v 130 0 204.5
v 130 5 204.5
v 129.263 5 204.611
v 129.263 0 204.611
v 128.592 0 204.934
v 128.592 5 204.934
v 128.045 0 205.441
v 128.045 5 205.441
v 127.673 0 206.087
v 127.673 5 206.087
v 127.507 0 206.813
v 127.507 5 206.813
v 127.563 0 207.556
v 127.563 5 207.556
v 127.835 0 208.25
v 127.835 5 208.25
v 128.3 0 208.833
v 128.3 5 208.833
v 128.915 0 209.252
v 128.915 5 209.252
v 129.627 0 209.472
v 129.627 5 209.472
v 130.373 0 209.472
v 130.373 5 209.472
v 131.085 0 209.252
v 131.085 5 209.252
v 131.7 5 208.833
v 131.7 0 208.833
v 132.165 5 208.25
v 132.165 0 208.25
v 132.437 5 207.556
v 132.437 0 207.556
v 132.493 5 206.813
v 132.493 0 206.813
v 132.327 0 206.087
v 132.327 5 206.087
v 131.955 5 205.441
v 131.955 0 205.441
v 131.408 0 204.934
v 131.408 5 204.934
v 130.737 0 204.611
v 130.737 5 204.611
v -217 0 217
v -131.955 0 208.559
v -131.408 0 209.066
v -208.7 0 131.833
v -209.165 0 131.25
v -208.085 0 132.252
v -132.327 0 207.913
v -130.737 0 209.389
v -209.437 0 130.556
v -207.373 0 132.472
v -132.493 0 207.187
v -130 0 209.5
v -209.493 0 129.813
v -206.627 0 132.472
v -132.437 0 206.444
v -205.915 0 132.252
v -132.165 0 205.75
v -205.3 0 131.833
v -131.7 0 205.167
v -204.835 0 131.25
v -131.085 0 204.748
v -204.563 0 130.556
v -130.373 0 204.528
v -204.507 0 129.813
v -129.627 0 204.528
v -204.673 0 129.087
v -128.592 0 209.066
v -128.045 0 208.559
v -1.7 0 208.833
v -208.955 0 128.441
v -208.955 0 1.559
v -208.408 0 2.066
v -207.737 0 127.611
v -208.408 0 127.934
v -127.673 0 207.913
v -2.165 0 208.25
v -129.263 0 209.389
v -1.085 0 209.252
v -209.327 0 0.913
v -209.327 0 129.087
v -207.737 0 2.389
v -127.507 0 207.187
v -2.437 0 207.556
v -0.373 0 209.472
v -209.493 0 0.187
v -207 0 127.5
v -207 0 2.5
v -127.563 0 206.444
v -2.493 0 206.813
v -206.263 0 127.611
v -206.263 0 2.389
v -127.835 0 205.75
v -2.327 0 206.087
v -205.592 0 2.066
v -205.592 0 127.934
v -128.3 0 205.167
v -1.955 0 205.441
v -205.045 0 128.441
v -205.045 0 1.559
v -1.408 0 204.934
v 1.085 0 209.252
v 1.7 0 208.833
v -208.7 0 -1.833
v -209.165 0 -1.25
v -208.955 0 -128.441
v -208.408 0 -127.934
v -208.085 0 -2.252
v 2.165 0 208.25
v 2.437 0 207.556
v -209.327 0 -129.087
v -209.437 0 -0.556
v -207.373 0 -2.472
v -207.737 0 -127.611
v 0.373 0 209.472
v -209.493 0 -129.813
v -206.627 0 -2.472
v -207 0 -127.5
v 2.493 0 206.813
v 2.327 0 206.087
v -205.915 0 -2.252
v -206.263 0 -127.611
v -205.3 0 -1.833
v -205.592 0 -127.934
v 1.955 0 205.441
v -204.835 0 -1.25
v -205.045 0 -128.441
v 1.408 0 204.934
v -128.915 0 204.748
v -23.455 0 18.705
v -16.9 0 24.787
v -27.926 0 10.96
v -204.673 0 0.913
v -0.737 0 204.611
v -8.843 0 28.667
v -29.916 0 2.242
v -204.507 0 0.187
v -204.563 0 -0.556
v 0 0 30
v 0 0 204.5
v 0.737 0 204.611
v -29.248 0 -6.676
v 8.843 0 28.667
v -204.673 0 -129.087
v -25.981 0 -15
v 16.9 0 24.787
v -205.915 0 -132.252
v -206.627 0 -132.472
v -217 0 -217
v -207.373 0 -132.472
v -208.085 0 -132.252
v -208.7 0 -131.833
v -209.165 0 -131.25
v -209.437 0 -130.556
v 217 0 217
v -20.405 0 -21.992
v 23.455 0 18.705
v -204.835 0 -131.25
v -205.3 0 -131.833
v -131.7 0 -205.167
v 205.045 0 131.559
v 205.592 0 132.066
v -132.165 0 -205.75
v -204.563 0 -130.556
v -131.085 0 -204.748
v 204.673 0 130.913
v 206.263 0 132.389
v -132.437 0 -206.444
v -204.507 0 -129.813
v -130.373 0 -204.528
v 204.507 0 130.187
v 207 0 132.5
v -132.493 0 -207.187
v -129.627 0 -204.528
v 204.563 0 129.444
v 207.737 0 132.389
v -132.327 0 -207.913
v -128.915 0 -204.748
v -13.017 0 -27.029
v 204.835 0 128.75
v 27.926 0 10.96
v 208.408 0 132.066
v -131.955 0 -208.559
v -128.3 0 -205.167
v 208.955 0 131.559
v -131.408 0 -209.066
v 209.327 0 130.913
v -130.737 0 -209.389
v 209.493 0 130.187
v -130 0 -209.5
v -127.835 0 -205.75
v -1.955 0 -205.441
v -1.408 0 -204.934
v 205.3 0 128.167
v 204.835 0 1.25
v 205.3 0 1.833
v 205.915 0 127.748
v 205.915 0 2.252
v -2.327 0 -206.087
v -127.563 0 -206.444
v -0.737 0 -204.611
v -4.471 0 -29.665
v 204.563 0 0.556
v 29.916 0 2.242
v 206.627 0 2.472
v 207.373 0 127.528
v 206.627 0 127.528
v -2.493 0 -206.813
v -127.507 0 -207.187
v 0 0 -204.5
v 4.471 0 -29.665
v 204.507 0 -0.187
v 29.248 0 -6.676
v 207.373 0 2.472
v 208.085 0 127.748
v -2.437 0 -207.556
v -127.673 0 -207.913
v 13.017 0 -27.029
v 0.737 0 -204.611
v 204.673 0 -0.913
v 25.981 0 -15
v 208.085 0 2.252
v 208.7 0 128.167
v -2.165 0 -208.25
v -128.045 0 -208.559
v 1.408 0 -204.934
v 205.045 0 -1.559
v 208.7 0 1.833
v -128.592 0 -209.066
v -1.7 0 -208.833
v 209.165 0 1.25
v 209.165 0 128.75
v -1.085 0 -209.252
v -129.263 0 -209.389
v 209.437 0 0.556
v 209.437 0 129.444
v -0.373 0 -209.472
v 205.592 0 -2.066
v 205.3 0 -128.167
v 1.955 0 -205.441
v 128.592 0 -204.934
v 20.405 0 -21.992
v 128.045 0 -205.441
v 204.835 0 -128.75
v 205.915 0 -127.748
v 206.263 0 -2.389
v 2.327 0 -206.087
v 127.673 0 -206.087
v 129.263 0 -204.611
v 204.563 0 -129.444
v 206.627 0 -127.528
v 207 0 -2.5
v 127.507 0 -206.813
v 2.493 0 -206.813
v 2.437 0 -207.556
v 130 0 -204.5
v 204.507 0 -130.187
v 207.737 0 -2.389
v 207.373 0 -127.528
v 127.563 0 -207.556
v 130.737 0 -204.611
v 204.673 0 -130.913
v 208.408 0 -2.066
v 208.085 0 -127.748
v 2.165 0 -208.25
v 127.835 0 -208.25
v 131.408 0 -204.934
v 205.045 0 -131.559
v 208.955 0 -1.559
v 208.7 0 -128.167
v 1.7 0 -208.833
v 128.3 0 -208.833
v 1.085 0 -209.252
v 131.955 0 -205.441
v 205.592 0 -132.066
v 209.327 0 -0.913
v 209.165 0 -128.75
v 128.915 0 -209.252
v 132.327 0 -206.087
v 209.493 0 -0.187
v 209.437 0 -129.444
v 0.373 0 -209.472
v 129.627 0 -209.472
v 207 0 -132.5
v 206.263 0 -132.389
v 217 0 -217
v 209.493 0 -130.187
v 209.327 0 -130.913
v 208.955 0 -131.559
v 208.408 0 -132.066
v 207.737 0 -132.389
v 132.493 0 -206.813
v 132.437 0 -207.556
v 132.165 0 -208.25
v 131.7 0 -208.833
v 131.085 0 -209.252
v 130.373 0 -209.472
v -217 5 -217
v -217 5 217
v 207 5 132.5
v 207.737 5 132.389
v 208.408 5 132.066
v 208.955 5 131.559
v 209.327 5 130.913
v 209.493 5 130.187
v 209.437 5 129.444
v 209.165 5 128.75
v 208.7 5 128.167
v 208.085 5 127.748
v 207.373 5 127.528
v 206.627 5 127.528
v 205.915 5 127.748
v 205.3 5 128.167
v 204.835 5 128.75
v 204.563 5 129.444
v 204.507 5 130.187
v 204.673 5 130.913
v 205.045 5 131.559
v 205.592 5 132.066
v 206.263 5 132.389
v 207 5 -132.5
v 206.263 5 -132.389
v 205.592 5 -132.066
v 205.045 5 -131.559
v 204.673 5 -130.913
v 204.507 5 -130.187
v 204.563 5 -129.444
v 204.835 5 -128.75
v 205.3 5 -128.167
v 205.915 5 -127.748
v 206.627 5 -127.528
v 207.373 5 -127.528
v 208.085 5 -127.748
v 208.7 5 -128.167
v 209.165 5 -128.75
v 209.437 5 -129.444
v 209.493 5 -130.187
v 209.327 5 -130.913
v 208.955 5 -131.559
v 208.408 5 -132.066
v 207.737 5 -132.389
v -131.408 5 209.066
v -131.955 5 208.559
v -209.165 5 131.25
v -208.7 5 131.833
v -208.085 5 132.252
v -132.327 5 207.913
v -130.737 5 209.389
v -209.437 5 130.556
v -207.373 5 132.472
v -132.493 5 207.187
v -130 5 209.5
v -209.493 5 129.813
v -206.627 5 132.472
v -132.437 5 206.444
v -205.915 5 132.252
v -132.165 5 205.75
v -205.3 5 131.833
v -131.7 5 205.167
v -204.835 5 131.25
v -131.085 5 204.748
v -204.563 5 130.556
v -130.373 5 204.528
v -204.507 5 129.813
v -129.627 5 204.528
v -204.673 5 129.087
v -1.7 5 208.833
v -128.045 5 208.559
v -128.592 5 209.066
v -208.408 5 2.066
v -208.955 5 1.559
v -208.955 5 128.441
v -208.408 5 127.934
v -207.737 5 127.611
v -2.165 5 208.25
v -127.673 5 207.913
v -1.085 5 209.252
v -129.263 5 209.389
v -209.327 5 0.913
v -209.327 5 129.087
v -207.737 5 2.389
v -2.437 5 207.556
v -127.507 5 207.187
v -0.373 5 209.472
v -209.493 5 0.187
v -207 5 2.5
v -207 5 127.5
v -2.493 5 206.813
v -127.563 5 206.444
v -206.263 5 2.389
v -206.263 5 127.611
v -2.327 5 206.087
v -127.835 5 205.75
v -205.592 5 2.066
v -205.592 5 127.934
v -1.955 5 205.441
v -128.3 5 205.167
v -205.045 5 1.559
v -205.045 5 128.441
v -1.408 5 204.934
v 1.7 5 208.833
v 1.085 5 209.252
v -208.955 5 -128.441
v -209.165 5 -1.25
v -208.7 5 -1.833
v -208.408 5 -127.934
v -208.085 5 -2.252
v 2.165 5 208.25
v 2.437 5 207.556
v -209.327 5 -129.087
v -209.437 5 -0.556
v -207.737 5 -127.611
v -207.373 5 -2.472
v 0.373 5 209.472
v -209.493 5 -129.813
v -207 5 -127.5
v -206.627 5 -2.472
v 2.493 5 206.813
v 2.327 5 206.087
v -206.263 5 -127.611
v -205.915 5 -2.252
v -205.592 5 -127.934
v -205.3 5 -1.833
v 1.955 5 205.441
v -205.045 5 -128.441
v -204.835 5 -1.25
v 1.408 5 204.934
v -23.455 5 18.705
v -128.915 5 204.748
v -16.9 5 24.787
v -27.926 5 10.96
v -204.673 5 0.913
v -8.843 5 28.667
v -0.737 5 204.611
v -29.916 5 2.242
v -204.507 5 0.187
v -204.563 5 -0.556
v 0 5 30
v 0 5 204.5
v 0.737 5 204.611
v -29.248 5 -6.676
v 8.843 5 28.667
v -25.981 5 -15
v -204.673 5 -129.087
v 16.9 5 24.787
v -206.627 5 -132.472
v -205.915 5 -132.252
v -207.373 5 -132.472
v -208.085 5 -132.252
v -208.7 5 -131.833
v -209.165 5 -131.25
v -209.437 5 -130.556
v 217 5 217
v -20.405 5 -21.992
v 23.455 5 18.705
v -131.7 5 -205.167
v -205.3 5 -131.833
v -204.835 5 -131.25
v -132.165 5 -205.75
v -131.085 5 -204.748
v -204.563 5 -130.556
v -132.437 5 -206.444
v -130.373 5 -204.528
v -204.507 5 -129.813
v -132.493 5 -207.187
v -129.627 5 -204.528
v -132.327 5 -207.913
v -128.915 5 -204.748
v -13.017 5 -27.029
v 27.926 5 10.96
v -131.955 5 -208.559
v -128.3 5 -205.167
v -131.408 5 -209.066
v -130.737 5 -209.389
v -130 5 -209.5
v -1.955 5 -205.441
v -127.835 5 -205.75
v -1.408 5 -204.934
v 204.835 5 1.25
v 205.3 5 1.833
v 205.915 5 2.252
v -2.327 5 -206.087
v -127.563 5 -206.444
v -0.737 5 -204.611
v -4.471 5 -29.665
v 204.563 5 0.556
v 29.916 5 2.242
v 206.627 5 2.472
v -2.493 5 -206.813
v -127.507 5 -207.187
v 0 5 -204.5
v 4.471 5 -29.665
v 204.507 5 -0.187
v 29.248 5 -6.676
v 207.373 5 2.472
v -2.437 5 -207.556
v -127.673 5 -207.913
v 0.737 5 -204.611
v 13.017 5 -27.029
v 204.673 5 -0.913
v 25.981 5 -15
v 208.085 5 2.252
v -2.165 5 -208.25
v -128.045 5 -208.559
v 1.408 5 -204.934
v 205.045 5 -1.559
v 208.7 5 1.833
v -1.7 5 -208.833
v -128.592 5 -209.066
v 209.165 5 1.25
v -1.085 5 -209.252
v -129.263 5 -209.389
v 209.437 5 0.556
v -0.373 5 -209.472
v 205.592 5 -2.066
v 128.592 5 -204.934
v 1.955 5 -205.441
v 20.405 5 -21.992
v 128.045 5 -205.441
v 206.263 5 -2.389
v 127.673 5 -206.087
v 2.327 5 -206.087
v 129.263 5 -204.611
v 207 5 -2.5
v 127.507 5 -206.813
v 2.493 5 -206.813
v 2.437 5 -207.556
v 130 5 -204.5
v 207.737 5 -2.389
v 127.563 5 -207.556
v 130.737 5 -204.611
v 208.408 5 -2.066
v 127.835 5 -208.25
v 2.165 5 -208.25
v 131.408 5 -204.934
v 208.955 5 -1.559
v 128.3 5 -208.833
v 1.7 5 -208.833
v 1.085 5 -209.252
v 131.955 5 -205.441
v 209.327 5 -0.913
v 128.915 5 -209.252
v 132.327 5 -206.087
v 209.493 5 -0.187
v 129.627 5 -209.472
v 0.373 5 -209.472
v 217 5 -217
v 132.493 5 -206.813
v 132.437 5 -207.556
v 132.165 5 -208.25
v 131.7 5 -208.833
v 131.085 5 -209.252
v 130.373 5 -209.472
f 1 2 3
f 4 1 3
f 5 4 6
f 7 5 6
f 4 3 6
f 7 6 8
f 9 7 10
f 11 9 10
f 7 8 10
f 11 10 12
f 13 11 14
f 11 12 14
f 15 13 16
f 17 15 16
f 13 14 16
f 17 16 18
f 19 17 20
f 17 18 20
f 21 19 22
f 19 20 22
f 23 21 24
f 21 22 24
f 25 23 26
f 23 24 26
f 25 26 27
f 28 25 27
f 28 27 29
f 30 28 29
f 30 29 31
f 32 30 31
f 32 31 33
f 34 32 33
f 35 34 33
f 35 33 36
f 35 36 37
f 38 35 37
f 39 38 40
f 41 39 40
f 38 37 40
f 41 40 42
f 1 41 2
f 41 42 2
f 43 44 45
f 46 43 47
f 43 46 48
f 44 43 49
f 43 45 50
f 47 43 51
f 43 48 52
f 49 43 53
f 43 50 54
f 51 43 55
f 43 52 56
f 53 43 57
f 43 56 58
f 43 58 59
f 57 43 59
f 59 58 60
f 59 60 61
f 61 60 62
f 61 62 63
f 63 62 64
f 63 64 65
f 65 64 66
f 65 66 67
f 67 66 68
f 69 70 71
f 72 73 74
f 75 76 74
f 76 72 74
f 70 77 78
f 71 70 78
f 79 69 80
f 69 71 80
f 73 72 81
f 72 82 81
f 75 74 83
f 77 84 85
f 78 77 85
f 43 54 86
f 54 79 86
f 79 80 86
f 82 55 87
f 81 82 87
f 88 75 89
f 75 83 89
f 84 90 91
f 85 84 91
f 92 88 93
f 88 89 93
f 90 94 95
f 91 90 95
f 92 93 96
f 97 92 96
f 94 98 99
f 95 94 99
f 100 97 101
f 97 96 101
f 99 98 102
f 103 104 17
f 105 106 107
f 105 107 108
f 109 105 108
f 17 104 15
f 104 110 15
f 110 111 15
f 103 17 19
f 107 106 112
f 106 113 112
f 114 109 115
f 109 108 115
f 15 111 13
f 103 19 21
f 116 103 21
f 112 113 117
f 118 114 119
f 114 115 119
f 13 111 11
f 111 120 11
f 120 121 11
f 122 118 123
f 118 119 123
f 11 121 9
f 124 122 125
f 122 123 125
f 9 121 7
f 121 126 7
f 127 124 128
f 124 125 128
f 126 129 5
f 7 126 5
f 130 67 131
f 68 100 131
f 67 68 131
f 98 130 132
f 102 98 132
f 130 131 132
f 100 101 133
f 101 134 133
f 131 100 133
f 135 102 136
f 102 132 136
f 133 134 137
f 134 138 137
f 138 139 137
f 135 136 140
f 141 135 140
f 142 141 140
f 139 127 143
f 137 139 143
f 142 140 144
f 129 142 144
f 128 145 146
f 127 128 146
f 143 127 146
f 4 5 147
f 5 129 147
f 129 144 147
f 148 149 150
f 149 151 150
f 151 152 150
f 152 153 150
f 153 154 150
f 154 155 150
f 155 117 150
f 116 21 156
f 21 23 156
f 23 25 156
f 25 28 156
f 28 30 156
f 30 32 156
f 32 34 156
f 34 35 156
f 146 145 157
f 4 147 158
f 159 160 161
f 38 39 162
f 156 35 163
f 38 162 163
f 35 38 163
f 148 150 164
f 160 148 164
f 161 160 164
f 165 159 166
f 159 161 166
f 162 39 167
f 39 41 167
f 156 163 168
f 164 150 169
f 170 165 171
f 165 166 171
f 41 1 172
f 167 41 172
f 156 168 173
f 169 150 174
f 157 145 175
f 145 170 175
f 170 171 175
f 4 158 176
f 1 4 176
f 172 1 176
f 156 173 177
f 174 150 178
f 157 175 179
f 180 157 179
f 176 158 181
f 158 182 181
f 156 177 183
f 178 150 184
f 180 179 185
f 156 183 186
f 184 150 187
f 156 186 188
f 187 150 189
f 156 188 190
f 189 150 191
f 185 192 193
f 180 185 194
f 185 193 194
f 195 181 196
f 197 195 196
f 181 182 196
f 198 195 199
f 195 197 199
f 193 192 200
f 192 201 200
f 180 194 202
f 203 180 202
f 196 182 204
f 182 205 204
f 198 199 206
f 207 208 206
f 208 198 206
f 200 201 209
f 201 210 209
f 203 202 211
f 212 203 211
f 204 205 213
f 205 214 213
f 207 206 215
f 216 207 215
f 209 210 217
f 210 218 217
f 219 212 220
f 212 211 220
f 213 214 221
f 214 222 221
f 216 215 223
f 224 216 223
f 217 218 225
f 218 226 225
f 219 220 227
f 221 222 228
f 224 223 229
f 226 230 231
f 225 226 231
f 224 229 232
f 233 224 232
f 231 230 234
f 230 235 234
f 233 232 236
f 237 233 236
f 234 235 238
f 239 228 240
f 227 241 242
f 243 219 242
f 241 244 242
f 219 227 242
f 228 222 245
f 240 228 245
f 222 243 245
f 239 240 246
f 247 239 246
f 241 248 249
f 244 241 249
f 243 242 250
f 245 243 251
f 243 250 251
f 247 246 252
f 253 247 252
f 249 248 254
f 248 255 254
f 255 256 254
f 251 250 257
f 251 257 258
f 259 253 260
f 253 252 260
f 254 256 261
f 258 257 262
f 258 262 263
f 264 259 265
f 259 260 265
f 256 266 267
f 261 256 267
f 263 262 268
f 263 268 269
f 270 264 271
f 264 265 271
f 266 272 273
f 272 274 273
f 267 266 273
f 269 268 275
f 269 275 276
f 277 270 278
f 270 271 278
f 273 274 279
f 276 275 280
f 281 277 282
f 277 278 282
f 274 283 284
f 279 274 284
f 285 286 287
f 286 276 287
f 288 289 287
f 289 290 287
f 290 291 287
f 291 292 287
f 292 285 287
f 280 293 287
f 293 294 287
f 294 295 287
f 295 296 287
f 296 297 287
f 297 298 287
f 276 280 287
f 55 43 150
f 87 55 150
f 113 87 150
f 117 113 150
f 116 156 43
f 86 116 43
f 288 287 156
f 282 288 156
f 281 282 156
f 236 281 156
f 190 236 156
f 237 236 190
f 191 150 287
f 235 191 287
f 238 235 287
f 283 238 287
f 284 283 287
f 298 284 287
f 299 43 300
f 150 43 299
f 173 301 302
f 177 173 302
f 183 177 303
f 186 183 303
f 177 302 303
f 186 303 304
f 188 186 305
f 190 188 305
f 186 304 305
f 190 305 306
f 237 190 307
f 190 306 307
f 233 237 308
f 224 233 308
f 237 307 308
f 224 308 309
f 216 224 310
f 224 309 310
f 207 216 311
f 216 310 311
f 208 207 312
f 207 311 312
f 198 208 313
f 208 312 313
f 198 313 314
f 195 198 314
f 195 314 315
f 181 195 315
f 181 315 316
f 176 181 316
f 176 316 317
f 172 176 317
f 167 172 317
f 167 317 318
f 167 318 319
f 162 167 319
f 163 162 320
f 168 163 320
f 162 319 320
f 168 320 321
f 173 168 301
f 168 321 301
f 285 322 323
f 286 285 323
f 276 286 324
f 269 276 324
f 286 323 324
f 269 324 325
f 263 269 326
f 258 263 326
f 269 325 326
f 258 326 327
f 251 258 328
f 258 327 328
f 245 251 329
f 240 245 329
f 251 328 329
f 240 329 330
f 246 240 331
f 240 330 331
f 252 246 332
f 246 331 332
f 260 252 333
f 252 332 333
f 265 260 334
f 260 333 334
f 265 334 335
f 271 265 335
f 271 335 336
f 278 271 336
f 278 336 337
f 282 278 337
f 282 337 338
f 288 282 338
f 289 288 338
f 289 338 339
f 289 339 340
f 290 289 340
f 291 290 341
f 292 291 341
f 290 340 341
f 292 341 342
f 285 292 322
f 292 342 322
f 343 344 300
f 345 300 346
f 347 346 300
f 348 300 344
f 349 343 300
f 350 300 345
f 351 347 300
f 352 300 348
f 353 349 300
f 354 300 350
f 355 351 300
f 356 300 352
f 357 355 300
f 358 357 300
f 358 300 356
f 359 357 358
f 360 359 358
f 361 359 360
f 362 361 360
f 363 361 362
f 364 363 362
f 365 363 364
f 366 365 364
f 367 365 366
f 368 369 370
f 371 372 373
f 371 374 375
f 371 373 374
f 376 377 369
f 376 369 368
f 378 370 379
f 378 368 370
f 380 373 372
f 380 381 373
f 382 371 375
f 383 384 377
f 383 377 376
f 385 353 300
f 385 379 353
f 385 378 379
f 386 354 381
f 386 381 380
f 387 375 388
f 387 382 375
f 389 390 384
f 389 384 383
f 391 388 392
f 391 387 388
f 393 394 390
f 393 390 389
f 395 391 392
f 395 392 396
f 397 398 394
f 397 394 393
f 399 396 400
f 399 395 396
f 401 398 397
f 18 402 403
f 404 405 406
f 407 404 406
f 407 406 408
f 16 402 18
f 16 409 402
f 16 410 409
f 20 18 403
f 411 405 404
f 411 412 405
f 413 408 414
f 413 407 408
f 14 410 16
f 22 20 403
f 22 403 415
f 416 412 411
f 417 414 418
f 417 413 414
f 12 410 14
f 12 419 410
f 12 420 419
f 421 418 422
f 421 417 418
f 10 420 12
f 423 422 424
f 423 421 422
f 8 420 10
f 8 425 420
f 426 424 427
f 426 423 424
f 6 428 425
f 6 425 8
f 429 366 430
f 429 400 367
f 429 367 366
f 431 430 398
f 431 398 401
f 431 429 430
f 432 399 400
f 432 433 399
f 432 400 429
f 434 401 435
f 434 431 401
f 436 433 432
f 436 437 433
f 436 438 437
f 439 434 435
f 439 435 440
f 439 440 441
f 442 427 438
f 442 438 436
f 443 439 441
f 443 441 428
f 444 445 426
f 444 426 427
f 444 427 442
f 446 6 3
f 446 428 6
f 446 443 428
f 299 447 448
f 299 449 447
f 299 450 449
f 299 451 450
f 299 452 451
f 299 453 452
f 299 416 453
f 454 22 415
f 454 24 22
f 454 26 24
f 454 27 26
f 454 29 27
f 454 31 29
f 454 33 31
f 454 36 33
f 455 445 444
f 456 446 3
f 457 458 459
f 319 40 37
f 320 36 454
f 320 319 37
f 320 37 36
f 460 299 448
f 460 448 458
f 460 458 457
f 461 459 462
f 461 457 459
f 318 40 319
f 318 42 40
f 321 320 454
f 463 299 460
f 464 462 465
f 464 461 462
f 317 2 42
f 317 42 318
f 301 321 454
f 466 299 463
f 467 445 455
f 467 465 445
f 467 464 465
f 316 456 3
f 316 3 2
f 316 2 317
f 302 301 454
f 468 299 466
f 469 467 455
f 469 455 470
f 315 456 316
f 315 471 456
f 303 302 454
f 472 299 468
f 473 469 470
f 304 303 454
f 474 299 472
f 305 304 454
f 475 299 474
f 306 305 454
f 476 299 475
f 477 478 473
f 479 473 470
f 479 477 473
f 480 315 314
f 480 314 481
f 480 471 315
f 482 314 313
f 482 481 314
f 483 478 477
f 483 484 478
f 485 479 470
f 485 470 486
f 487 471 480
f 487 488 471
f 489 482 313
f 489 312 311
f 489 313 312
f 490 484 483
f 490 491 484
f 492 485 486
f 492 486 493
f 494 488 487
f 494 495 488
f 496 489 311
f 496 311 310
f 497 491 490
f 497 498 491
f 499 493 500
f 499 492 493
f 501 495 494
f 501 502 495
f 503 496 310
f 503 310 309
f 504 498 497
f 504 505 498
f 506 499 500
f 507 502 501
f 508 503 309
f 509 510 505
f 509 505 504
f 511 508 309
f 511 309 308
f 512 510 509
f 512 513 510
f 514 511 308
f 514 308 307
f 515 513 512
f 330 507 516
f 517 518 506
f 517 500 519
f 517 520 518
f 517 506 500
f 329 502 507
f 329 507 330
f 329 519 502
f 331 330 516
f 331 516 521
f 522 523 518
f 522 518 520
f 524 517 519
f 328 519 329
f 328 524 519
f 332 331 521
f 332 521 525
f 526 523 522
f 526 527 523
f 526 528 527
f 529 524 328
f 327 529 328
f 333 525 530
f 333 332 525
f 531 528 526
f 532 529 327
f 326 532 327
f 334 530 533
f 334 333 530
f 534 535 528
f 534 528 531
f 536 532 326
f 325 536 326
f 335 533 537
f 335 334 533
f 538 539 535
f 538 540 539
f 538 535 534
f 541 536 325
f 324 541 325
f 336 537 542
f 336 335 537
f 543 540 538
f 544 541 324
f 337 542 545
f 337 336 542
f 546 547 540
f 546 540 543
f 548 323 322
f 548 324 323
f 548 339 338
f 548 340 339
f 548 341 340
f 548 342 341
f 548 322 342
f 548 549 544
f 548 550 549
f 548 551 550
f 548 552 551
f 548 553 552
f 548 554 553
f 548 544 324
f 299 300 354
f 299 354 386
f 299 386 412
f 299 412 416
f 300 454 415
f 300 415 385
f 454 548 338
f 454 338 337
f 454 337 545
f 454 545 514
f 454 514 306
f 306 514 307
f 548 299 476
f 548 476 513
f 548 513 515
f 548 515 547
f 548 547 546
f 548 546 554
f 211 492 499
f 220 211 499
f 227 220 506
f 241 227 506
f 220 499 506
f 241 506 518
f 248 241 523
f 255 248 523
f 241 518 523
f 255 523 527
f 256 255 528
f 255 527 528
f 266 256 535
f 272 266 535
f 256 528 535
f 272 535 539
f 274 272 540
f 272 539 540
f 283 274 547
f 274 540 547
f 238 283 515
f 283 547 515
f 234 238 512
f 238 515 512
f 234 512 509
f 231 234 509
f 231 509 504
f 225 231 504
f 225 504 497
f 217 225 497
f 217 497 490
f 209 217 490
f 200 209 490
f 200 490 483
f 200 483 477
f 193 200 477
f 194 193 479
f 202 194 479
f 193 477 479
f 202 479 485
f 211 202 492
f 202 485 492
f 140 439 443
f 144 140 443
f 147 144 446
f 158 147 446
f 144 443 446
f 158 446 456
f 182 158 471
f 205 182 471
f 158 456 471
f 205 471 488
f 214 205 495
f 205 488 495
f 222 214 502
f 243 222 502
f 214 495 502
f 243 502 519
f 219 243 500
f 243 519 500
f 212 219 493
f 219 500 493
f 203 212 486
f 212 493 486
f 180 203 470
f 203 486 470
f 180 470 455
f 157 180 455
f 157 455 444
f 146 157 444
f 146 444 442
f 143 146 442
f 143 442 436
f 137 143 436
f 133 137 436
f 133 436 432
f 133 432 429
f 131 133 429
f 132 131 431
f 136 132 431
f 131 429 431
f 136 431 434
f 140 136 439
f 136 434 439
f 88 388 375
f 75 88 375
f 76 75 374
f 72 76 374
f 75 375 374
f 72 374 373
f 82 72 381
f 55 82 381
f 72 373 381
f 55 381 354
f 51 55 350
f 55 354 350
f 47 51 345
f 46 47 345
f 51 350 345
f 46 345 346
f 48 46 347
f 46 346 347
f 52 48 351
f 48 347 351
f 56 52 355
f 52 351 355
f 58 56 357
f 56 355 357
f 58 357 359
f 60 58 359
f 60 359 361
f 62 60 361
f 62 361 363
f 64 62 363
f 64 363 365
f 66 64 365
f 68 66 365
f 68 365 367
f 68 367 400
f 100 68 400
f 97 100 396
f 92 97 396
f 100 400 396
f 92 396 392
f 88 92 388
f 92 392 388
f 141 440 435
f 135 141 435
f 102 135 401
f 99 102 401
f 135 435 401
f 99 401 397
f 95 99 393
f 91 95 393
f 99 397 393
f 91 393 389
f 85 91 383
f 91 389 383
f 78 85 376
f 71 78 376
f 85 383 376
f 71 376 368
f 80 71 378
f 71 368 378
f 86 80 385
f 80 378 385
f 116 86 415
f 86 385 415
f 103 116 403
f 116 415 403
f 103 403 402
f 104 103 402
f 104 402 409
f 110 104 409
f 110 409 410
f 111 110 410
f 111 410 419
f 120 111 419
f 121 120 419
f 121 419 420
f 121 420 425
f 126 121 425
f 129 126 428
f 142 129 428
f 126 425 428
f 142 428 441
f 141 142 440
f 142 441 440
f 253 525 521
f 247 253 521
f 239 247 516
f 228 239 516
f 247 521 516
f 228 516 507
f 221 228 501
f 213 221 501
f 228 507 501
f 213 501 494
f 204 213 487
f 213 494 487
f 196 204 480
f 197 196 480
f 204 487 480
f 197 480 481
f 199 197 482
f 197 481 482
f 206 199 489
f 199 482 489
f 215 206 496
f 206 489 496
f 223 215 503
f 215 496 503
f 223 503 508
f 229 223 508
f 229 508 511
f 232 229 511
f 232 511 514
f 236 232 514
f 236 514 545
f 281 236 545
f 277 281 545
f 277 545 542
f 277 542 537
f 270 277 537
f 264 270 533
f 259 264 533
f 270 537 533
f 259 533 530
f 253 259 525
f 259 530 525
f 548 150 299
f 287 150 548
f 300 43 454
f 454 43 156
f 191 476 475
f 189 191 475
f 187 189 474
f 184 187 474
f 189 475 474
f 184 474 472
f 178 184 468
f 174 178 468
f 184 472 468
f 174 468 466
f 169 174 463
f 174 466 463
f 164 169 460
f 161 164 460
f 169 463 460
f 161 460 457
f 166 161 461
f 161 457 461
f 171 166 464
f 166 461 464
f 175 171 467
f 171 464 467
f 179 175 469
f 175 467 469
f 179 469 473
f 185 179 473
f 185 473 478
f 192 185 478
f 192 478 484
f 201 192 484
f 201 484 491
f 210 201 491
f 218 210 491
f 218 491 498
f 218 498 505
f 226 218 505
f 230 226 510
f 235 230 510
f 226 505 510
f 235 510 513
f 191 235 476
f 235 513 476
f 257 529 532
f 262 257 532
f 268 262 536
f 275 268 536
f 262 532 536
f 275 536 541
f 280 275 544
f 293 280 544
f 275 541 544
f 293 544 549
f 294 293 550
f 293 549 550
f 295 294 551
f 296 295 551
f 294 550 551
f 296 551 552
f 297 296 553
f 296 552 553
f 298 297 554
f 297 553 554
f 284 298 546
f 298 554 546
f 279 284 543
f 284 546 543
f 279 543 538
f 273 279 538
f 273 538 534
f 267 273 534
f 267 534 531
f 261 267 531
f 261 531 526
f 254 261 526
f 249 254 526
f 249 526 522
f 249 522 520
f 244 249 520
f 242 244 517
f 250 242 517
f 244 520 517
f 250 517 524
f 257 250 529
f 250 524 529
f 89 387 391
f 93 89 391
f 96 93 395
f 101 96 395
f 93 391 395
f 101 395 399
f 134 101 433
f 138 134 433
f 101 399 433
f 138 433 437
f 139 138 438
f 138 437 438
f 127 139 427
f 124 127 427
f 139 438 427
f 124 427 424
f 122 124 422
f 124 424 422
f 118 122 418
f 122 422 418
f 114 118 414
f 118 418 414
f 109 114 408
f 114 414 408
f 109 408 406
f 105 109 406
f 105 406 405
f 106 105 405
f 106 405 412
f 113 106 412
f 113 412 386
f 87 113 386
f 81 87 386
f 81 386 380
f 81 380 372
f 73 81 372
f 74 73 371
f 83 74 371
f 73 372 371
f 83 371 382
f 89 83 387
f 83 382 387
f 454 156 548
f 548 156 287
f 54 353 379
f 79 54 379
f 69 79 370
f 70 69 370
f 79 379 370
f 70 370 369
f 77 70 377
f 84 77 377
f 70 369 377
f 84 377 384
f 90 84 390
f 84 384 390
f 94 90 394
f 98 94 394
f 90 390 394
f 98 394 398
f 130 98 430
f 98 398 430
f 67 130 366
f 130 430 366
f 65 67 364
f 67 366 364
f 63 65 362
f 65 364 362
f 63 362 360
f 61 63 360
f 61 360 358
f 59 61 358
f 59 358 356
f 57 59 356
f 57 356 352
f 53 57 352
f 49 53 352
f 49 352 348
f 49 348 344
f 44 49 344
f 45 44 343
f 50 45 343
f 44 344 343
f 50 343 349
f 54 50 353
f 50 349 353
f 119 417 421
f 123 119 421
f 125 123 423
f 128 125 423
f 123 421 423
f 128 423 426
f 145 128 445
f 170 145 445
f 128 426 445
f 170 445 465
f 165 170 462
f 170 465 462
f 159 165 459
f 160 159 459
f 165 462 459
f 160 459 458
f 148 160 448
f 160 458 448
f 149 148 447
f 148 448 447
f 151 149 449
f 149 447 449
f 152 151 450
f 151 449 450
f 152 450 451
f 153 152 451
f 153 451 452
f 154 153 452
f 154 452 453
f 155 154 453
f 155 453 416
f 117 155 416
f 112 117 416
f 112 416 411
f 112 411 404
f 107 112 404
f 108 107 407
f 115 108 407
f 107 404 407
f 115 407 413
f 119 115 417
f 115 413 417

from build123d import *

# Parameters (mm, degrees)
SKETCH1_W           = 434
SKETCH1_H           = 434
BOSS_EXTRUDE1_DEPTH = 5
SKETCH2_R           = 2.5
CUT_EXTRUDE1_DEPTH  = 5
SKETCH3_R           = 30
CUT_EXTRUDE2_DEPTH  = 5


with BuildPart() as part:
    # Sketch1 → Boss-Extrude1 (new body)
    with BuildSketch(Plane(origin=(0, 0, 0), x_dir=(1, 0, 0), z_dir=(0, 1, 0))):
        Rectangle(SKETCH1_W, SKETCH1_H)
    extrude(amount=BOSS_EXTRUDE1_DEPTH)

    # Sketch2 → Cut-Extrude1 (cut)
    with BuildSketch(Plane(origin=(0, 5, 0), x_dir=(1, 0, 0), z_dir=(0, 1, 0))):
        with Locations(Location((-207, 130, 0), (0, 0, 270))):
            Circle(SKETCH2_R)
        with Locations(Location((-207, 0, 0), (0, 0, 270))):
            Circle(SKETCH2_R)
        with Locations(Location((-207, -130, 0), (0, 0, 90))):
            Circle(SKETCH2_R)
        with Locations(Location((207, -130, 0), (0, 0, 270))):
            Circle(SKETCH2_R)
        with Locations(Location((207, 0, 0), (0, 0, 90))):
            Circle(SKETCH2_R)
        with Locations(Location((207, 130, 0), (0, 0, 90))):
            Circle(SKETCH2_R)
        with Locations(Location((130, 207, 0), (0, 0, 270))):
            Circle(SKETCH2_R)
        with Locations(Location((0, 207, 0), (0, 0, 270))):
            Circle(SKETCH2_R)
        with Locations(Location((-130, 207, 0), (0, 0, 90))):
            Circle(SKETCH2_R)
        with Locations(Location((-130, -207, 0), (0, 0, 270))):
            Circle(SKETCH2_R)
        with Locations(Location((0, -207, 0), (0, 0, 90))):
            Circle(SKETCH2_R)
        with Locations(Location((130, -207, 0), (0, 0, 90))):
            Circle(SKETCH2_R)
    extrude(amount=-CUT_EXTRUDE1_DEPTH, mode=Mode.SUBTRACT)

    # Sketch3 → Cut-Extrude2 (cut)
    with BuildSketch(Plane(origin=(0, 5, 0), x_dir=(1, 0, 0), z_dir=(0, 1, 0))):
        with Locations(Location((0, 0, 0), (0, 0, 270))):
            Circle(SKETCH3_R)
    extrude(amount=-CUT_EXTRUDE2_DEPTH, mode=Mode.SUBTRACT)


solid = part.part
